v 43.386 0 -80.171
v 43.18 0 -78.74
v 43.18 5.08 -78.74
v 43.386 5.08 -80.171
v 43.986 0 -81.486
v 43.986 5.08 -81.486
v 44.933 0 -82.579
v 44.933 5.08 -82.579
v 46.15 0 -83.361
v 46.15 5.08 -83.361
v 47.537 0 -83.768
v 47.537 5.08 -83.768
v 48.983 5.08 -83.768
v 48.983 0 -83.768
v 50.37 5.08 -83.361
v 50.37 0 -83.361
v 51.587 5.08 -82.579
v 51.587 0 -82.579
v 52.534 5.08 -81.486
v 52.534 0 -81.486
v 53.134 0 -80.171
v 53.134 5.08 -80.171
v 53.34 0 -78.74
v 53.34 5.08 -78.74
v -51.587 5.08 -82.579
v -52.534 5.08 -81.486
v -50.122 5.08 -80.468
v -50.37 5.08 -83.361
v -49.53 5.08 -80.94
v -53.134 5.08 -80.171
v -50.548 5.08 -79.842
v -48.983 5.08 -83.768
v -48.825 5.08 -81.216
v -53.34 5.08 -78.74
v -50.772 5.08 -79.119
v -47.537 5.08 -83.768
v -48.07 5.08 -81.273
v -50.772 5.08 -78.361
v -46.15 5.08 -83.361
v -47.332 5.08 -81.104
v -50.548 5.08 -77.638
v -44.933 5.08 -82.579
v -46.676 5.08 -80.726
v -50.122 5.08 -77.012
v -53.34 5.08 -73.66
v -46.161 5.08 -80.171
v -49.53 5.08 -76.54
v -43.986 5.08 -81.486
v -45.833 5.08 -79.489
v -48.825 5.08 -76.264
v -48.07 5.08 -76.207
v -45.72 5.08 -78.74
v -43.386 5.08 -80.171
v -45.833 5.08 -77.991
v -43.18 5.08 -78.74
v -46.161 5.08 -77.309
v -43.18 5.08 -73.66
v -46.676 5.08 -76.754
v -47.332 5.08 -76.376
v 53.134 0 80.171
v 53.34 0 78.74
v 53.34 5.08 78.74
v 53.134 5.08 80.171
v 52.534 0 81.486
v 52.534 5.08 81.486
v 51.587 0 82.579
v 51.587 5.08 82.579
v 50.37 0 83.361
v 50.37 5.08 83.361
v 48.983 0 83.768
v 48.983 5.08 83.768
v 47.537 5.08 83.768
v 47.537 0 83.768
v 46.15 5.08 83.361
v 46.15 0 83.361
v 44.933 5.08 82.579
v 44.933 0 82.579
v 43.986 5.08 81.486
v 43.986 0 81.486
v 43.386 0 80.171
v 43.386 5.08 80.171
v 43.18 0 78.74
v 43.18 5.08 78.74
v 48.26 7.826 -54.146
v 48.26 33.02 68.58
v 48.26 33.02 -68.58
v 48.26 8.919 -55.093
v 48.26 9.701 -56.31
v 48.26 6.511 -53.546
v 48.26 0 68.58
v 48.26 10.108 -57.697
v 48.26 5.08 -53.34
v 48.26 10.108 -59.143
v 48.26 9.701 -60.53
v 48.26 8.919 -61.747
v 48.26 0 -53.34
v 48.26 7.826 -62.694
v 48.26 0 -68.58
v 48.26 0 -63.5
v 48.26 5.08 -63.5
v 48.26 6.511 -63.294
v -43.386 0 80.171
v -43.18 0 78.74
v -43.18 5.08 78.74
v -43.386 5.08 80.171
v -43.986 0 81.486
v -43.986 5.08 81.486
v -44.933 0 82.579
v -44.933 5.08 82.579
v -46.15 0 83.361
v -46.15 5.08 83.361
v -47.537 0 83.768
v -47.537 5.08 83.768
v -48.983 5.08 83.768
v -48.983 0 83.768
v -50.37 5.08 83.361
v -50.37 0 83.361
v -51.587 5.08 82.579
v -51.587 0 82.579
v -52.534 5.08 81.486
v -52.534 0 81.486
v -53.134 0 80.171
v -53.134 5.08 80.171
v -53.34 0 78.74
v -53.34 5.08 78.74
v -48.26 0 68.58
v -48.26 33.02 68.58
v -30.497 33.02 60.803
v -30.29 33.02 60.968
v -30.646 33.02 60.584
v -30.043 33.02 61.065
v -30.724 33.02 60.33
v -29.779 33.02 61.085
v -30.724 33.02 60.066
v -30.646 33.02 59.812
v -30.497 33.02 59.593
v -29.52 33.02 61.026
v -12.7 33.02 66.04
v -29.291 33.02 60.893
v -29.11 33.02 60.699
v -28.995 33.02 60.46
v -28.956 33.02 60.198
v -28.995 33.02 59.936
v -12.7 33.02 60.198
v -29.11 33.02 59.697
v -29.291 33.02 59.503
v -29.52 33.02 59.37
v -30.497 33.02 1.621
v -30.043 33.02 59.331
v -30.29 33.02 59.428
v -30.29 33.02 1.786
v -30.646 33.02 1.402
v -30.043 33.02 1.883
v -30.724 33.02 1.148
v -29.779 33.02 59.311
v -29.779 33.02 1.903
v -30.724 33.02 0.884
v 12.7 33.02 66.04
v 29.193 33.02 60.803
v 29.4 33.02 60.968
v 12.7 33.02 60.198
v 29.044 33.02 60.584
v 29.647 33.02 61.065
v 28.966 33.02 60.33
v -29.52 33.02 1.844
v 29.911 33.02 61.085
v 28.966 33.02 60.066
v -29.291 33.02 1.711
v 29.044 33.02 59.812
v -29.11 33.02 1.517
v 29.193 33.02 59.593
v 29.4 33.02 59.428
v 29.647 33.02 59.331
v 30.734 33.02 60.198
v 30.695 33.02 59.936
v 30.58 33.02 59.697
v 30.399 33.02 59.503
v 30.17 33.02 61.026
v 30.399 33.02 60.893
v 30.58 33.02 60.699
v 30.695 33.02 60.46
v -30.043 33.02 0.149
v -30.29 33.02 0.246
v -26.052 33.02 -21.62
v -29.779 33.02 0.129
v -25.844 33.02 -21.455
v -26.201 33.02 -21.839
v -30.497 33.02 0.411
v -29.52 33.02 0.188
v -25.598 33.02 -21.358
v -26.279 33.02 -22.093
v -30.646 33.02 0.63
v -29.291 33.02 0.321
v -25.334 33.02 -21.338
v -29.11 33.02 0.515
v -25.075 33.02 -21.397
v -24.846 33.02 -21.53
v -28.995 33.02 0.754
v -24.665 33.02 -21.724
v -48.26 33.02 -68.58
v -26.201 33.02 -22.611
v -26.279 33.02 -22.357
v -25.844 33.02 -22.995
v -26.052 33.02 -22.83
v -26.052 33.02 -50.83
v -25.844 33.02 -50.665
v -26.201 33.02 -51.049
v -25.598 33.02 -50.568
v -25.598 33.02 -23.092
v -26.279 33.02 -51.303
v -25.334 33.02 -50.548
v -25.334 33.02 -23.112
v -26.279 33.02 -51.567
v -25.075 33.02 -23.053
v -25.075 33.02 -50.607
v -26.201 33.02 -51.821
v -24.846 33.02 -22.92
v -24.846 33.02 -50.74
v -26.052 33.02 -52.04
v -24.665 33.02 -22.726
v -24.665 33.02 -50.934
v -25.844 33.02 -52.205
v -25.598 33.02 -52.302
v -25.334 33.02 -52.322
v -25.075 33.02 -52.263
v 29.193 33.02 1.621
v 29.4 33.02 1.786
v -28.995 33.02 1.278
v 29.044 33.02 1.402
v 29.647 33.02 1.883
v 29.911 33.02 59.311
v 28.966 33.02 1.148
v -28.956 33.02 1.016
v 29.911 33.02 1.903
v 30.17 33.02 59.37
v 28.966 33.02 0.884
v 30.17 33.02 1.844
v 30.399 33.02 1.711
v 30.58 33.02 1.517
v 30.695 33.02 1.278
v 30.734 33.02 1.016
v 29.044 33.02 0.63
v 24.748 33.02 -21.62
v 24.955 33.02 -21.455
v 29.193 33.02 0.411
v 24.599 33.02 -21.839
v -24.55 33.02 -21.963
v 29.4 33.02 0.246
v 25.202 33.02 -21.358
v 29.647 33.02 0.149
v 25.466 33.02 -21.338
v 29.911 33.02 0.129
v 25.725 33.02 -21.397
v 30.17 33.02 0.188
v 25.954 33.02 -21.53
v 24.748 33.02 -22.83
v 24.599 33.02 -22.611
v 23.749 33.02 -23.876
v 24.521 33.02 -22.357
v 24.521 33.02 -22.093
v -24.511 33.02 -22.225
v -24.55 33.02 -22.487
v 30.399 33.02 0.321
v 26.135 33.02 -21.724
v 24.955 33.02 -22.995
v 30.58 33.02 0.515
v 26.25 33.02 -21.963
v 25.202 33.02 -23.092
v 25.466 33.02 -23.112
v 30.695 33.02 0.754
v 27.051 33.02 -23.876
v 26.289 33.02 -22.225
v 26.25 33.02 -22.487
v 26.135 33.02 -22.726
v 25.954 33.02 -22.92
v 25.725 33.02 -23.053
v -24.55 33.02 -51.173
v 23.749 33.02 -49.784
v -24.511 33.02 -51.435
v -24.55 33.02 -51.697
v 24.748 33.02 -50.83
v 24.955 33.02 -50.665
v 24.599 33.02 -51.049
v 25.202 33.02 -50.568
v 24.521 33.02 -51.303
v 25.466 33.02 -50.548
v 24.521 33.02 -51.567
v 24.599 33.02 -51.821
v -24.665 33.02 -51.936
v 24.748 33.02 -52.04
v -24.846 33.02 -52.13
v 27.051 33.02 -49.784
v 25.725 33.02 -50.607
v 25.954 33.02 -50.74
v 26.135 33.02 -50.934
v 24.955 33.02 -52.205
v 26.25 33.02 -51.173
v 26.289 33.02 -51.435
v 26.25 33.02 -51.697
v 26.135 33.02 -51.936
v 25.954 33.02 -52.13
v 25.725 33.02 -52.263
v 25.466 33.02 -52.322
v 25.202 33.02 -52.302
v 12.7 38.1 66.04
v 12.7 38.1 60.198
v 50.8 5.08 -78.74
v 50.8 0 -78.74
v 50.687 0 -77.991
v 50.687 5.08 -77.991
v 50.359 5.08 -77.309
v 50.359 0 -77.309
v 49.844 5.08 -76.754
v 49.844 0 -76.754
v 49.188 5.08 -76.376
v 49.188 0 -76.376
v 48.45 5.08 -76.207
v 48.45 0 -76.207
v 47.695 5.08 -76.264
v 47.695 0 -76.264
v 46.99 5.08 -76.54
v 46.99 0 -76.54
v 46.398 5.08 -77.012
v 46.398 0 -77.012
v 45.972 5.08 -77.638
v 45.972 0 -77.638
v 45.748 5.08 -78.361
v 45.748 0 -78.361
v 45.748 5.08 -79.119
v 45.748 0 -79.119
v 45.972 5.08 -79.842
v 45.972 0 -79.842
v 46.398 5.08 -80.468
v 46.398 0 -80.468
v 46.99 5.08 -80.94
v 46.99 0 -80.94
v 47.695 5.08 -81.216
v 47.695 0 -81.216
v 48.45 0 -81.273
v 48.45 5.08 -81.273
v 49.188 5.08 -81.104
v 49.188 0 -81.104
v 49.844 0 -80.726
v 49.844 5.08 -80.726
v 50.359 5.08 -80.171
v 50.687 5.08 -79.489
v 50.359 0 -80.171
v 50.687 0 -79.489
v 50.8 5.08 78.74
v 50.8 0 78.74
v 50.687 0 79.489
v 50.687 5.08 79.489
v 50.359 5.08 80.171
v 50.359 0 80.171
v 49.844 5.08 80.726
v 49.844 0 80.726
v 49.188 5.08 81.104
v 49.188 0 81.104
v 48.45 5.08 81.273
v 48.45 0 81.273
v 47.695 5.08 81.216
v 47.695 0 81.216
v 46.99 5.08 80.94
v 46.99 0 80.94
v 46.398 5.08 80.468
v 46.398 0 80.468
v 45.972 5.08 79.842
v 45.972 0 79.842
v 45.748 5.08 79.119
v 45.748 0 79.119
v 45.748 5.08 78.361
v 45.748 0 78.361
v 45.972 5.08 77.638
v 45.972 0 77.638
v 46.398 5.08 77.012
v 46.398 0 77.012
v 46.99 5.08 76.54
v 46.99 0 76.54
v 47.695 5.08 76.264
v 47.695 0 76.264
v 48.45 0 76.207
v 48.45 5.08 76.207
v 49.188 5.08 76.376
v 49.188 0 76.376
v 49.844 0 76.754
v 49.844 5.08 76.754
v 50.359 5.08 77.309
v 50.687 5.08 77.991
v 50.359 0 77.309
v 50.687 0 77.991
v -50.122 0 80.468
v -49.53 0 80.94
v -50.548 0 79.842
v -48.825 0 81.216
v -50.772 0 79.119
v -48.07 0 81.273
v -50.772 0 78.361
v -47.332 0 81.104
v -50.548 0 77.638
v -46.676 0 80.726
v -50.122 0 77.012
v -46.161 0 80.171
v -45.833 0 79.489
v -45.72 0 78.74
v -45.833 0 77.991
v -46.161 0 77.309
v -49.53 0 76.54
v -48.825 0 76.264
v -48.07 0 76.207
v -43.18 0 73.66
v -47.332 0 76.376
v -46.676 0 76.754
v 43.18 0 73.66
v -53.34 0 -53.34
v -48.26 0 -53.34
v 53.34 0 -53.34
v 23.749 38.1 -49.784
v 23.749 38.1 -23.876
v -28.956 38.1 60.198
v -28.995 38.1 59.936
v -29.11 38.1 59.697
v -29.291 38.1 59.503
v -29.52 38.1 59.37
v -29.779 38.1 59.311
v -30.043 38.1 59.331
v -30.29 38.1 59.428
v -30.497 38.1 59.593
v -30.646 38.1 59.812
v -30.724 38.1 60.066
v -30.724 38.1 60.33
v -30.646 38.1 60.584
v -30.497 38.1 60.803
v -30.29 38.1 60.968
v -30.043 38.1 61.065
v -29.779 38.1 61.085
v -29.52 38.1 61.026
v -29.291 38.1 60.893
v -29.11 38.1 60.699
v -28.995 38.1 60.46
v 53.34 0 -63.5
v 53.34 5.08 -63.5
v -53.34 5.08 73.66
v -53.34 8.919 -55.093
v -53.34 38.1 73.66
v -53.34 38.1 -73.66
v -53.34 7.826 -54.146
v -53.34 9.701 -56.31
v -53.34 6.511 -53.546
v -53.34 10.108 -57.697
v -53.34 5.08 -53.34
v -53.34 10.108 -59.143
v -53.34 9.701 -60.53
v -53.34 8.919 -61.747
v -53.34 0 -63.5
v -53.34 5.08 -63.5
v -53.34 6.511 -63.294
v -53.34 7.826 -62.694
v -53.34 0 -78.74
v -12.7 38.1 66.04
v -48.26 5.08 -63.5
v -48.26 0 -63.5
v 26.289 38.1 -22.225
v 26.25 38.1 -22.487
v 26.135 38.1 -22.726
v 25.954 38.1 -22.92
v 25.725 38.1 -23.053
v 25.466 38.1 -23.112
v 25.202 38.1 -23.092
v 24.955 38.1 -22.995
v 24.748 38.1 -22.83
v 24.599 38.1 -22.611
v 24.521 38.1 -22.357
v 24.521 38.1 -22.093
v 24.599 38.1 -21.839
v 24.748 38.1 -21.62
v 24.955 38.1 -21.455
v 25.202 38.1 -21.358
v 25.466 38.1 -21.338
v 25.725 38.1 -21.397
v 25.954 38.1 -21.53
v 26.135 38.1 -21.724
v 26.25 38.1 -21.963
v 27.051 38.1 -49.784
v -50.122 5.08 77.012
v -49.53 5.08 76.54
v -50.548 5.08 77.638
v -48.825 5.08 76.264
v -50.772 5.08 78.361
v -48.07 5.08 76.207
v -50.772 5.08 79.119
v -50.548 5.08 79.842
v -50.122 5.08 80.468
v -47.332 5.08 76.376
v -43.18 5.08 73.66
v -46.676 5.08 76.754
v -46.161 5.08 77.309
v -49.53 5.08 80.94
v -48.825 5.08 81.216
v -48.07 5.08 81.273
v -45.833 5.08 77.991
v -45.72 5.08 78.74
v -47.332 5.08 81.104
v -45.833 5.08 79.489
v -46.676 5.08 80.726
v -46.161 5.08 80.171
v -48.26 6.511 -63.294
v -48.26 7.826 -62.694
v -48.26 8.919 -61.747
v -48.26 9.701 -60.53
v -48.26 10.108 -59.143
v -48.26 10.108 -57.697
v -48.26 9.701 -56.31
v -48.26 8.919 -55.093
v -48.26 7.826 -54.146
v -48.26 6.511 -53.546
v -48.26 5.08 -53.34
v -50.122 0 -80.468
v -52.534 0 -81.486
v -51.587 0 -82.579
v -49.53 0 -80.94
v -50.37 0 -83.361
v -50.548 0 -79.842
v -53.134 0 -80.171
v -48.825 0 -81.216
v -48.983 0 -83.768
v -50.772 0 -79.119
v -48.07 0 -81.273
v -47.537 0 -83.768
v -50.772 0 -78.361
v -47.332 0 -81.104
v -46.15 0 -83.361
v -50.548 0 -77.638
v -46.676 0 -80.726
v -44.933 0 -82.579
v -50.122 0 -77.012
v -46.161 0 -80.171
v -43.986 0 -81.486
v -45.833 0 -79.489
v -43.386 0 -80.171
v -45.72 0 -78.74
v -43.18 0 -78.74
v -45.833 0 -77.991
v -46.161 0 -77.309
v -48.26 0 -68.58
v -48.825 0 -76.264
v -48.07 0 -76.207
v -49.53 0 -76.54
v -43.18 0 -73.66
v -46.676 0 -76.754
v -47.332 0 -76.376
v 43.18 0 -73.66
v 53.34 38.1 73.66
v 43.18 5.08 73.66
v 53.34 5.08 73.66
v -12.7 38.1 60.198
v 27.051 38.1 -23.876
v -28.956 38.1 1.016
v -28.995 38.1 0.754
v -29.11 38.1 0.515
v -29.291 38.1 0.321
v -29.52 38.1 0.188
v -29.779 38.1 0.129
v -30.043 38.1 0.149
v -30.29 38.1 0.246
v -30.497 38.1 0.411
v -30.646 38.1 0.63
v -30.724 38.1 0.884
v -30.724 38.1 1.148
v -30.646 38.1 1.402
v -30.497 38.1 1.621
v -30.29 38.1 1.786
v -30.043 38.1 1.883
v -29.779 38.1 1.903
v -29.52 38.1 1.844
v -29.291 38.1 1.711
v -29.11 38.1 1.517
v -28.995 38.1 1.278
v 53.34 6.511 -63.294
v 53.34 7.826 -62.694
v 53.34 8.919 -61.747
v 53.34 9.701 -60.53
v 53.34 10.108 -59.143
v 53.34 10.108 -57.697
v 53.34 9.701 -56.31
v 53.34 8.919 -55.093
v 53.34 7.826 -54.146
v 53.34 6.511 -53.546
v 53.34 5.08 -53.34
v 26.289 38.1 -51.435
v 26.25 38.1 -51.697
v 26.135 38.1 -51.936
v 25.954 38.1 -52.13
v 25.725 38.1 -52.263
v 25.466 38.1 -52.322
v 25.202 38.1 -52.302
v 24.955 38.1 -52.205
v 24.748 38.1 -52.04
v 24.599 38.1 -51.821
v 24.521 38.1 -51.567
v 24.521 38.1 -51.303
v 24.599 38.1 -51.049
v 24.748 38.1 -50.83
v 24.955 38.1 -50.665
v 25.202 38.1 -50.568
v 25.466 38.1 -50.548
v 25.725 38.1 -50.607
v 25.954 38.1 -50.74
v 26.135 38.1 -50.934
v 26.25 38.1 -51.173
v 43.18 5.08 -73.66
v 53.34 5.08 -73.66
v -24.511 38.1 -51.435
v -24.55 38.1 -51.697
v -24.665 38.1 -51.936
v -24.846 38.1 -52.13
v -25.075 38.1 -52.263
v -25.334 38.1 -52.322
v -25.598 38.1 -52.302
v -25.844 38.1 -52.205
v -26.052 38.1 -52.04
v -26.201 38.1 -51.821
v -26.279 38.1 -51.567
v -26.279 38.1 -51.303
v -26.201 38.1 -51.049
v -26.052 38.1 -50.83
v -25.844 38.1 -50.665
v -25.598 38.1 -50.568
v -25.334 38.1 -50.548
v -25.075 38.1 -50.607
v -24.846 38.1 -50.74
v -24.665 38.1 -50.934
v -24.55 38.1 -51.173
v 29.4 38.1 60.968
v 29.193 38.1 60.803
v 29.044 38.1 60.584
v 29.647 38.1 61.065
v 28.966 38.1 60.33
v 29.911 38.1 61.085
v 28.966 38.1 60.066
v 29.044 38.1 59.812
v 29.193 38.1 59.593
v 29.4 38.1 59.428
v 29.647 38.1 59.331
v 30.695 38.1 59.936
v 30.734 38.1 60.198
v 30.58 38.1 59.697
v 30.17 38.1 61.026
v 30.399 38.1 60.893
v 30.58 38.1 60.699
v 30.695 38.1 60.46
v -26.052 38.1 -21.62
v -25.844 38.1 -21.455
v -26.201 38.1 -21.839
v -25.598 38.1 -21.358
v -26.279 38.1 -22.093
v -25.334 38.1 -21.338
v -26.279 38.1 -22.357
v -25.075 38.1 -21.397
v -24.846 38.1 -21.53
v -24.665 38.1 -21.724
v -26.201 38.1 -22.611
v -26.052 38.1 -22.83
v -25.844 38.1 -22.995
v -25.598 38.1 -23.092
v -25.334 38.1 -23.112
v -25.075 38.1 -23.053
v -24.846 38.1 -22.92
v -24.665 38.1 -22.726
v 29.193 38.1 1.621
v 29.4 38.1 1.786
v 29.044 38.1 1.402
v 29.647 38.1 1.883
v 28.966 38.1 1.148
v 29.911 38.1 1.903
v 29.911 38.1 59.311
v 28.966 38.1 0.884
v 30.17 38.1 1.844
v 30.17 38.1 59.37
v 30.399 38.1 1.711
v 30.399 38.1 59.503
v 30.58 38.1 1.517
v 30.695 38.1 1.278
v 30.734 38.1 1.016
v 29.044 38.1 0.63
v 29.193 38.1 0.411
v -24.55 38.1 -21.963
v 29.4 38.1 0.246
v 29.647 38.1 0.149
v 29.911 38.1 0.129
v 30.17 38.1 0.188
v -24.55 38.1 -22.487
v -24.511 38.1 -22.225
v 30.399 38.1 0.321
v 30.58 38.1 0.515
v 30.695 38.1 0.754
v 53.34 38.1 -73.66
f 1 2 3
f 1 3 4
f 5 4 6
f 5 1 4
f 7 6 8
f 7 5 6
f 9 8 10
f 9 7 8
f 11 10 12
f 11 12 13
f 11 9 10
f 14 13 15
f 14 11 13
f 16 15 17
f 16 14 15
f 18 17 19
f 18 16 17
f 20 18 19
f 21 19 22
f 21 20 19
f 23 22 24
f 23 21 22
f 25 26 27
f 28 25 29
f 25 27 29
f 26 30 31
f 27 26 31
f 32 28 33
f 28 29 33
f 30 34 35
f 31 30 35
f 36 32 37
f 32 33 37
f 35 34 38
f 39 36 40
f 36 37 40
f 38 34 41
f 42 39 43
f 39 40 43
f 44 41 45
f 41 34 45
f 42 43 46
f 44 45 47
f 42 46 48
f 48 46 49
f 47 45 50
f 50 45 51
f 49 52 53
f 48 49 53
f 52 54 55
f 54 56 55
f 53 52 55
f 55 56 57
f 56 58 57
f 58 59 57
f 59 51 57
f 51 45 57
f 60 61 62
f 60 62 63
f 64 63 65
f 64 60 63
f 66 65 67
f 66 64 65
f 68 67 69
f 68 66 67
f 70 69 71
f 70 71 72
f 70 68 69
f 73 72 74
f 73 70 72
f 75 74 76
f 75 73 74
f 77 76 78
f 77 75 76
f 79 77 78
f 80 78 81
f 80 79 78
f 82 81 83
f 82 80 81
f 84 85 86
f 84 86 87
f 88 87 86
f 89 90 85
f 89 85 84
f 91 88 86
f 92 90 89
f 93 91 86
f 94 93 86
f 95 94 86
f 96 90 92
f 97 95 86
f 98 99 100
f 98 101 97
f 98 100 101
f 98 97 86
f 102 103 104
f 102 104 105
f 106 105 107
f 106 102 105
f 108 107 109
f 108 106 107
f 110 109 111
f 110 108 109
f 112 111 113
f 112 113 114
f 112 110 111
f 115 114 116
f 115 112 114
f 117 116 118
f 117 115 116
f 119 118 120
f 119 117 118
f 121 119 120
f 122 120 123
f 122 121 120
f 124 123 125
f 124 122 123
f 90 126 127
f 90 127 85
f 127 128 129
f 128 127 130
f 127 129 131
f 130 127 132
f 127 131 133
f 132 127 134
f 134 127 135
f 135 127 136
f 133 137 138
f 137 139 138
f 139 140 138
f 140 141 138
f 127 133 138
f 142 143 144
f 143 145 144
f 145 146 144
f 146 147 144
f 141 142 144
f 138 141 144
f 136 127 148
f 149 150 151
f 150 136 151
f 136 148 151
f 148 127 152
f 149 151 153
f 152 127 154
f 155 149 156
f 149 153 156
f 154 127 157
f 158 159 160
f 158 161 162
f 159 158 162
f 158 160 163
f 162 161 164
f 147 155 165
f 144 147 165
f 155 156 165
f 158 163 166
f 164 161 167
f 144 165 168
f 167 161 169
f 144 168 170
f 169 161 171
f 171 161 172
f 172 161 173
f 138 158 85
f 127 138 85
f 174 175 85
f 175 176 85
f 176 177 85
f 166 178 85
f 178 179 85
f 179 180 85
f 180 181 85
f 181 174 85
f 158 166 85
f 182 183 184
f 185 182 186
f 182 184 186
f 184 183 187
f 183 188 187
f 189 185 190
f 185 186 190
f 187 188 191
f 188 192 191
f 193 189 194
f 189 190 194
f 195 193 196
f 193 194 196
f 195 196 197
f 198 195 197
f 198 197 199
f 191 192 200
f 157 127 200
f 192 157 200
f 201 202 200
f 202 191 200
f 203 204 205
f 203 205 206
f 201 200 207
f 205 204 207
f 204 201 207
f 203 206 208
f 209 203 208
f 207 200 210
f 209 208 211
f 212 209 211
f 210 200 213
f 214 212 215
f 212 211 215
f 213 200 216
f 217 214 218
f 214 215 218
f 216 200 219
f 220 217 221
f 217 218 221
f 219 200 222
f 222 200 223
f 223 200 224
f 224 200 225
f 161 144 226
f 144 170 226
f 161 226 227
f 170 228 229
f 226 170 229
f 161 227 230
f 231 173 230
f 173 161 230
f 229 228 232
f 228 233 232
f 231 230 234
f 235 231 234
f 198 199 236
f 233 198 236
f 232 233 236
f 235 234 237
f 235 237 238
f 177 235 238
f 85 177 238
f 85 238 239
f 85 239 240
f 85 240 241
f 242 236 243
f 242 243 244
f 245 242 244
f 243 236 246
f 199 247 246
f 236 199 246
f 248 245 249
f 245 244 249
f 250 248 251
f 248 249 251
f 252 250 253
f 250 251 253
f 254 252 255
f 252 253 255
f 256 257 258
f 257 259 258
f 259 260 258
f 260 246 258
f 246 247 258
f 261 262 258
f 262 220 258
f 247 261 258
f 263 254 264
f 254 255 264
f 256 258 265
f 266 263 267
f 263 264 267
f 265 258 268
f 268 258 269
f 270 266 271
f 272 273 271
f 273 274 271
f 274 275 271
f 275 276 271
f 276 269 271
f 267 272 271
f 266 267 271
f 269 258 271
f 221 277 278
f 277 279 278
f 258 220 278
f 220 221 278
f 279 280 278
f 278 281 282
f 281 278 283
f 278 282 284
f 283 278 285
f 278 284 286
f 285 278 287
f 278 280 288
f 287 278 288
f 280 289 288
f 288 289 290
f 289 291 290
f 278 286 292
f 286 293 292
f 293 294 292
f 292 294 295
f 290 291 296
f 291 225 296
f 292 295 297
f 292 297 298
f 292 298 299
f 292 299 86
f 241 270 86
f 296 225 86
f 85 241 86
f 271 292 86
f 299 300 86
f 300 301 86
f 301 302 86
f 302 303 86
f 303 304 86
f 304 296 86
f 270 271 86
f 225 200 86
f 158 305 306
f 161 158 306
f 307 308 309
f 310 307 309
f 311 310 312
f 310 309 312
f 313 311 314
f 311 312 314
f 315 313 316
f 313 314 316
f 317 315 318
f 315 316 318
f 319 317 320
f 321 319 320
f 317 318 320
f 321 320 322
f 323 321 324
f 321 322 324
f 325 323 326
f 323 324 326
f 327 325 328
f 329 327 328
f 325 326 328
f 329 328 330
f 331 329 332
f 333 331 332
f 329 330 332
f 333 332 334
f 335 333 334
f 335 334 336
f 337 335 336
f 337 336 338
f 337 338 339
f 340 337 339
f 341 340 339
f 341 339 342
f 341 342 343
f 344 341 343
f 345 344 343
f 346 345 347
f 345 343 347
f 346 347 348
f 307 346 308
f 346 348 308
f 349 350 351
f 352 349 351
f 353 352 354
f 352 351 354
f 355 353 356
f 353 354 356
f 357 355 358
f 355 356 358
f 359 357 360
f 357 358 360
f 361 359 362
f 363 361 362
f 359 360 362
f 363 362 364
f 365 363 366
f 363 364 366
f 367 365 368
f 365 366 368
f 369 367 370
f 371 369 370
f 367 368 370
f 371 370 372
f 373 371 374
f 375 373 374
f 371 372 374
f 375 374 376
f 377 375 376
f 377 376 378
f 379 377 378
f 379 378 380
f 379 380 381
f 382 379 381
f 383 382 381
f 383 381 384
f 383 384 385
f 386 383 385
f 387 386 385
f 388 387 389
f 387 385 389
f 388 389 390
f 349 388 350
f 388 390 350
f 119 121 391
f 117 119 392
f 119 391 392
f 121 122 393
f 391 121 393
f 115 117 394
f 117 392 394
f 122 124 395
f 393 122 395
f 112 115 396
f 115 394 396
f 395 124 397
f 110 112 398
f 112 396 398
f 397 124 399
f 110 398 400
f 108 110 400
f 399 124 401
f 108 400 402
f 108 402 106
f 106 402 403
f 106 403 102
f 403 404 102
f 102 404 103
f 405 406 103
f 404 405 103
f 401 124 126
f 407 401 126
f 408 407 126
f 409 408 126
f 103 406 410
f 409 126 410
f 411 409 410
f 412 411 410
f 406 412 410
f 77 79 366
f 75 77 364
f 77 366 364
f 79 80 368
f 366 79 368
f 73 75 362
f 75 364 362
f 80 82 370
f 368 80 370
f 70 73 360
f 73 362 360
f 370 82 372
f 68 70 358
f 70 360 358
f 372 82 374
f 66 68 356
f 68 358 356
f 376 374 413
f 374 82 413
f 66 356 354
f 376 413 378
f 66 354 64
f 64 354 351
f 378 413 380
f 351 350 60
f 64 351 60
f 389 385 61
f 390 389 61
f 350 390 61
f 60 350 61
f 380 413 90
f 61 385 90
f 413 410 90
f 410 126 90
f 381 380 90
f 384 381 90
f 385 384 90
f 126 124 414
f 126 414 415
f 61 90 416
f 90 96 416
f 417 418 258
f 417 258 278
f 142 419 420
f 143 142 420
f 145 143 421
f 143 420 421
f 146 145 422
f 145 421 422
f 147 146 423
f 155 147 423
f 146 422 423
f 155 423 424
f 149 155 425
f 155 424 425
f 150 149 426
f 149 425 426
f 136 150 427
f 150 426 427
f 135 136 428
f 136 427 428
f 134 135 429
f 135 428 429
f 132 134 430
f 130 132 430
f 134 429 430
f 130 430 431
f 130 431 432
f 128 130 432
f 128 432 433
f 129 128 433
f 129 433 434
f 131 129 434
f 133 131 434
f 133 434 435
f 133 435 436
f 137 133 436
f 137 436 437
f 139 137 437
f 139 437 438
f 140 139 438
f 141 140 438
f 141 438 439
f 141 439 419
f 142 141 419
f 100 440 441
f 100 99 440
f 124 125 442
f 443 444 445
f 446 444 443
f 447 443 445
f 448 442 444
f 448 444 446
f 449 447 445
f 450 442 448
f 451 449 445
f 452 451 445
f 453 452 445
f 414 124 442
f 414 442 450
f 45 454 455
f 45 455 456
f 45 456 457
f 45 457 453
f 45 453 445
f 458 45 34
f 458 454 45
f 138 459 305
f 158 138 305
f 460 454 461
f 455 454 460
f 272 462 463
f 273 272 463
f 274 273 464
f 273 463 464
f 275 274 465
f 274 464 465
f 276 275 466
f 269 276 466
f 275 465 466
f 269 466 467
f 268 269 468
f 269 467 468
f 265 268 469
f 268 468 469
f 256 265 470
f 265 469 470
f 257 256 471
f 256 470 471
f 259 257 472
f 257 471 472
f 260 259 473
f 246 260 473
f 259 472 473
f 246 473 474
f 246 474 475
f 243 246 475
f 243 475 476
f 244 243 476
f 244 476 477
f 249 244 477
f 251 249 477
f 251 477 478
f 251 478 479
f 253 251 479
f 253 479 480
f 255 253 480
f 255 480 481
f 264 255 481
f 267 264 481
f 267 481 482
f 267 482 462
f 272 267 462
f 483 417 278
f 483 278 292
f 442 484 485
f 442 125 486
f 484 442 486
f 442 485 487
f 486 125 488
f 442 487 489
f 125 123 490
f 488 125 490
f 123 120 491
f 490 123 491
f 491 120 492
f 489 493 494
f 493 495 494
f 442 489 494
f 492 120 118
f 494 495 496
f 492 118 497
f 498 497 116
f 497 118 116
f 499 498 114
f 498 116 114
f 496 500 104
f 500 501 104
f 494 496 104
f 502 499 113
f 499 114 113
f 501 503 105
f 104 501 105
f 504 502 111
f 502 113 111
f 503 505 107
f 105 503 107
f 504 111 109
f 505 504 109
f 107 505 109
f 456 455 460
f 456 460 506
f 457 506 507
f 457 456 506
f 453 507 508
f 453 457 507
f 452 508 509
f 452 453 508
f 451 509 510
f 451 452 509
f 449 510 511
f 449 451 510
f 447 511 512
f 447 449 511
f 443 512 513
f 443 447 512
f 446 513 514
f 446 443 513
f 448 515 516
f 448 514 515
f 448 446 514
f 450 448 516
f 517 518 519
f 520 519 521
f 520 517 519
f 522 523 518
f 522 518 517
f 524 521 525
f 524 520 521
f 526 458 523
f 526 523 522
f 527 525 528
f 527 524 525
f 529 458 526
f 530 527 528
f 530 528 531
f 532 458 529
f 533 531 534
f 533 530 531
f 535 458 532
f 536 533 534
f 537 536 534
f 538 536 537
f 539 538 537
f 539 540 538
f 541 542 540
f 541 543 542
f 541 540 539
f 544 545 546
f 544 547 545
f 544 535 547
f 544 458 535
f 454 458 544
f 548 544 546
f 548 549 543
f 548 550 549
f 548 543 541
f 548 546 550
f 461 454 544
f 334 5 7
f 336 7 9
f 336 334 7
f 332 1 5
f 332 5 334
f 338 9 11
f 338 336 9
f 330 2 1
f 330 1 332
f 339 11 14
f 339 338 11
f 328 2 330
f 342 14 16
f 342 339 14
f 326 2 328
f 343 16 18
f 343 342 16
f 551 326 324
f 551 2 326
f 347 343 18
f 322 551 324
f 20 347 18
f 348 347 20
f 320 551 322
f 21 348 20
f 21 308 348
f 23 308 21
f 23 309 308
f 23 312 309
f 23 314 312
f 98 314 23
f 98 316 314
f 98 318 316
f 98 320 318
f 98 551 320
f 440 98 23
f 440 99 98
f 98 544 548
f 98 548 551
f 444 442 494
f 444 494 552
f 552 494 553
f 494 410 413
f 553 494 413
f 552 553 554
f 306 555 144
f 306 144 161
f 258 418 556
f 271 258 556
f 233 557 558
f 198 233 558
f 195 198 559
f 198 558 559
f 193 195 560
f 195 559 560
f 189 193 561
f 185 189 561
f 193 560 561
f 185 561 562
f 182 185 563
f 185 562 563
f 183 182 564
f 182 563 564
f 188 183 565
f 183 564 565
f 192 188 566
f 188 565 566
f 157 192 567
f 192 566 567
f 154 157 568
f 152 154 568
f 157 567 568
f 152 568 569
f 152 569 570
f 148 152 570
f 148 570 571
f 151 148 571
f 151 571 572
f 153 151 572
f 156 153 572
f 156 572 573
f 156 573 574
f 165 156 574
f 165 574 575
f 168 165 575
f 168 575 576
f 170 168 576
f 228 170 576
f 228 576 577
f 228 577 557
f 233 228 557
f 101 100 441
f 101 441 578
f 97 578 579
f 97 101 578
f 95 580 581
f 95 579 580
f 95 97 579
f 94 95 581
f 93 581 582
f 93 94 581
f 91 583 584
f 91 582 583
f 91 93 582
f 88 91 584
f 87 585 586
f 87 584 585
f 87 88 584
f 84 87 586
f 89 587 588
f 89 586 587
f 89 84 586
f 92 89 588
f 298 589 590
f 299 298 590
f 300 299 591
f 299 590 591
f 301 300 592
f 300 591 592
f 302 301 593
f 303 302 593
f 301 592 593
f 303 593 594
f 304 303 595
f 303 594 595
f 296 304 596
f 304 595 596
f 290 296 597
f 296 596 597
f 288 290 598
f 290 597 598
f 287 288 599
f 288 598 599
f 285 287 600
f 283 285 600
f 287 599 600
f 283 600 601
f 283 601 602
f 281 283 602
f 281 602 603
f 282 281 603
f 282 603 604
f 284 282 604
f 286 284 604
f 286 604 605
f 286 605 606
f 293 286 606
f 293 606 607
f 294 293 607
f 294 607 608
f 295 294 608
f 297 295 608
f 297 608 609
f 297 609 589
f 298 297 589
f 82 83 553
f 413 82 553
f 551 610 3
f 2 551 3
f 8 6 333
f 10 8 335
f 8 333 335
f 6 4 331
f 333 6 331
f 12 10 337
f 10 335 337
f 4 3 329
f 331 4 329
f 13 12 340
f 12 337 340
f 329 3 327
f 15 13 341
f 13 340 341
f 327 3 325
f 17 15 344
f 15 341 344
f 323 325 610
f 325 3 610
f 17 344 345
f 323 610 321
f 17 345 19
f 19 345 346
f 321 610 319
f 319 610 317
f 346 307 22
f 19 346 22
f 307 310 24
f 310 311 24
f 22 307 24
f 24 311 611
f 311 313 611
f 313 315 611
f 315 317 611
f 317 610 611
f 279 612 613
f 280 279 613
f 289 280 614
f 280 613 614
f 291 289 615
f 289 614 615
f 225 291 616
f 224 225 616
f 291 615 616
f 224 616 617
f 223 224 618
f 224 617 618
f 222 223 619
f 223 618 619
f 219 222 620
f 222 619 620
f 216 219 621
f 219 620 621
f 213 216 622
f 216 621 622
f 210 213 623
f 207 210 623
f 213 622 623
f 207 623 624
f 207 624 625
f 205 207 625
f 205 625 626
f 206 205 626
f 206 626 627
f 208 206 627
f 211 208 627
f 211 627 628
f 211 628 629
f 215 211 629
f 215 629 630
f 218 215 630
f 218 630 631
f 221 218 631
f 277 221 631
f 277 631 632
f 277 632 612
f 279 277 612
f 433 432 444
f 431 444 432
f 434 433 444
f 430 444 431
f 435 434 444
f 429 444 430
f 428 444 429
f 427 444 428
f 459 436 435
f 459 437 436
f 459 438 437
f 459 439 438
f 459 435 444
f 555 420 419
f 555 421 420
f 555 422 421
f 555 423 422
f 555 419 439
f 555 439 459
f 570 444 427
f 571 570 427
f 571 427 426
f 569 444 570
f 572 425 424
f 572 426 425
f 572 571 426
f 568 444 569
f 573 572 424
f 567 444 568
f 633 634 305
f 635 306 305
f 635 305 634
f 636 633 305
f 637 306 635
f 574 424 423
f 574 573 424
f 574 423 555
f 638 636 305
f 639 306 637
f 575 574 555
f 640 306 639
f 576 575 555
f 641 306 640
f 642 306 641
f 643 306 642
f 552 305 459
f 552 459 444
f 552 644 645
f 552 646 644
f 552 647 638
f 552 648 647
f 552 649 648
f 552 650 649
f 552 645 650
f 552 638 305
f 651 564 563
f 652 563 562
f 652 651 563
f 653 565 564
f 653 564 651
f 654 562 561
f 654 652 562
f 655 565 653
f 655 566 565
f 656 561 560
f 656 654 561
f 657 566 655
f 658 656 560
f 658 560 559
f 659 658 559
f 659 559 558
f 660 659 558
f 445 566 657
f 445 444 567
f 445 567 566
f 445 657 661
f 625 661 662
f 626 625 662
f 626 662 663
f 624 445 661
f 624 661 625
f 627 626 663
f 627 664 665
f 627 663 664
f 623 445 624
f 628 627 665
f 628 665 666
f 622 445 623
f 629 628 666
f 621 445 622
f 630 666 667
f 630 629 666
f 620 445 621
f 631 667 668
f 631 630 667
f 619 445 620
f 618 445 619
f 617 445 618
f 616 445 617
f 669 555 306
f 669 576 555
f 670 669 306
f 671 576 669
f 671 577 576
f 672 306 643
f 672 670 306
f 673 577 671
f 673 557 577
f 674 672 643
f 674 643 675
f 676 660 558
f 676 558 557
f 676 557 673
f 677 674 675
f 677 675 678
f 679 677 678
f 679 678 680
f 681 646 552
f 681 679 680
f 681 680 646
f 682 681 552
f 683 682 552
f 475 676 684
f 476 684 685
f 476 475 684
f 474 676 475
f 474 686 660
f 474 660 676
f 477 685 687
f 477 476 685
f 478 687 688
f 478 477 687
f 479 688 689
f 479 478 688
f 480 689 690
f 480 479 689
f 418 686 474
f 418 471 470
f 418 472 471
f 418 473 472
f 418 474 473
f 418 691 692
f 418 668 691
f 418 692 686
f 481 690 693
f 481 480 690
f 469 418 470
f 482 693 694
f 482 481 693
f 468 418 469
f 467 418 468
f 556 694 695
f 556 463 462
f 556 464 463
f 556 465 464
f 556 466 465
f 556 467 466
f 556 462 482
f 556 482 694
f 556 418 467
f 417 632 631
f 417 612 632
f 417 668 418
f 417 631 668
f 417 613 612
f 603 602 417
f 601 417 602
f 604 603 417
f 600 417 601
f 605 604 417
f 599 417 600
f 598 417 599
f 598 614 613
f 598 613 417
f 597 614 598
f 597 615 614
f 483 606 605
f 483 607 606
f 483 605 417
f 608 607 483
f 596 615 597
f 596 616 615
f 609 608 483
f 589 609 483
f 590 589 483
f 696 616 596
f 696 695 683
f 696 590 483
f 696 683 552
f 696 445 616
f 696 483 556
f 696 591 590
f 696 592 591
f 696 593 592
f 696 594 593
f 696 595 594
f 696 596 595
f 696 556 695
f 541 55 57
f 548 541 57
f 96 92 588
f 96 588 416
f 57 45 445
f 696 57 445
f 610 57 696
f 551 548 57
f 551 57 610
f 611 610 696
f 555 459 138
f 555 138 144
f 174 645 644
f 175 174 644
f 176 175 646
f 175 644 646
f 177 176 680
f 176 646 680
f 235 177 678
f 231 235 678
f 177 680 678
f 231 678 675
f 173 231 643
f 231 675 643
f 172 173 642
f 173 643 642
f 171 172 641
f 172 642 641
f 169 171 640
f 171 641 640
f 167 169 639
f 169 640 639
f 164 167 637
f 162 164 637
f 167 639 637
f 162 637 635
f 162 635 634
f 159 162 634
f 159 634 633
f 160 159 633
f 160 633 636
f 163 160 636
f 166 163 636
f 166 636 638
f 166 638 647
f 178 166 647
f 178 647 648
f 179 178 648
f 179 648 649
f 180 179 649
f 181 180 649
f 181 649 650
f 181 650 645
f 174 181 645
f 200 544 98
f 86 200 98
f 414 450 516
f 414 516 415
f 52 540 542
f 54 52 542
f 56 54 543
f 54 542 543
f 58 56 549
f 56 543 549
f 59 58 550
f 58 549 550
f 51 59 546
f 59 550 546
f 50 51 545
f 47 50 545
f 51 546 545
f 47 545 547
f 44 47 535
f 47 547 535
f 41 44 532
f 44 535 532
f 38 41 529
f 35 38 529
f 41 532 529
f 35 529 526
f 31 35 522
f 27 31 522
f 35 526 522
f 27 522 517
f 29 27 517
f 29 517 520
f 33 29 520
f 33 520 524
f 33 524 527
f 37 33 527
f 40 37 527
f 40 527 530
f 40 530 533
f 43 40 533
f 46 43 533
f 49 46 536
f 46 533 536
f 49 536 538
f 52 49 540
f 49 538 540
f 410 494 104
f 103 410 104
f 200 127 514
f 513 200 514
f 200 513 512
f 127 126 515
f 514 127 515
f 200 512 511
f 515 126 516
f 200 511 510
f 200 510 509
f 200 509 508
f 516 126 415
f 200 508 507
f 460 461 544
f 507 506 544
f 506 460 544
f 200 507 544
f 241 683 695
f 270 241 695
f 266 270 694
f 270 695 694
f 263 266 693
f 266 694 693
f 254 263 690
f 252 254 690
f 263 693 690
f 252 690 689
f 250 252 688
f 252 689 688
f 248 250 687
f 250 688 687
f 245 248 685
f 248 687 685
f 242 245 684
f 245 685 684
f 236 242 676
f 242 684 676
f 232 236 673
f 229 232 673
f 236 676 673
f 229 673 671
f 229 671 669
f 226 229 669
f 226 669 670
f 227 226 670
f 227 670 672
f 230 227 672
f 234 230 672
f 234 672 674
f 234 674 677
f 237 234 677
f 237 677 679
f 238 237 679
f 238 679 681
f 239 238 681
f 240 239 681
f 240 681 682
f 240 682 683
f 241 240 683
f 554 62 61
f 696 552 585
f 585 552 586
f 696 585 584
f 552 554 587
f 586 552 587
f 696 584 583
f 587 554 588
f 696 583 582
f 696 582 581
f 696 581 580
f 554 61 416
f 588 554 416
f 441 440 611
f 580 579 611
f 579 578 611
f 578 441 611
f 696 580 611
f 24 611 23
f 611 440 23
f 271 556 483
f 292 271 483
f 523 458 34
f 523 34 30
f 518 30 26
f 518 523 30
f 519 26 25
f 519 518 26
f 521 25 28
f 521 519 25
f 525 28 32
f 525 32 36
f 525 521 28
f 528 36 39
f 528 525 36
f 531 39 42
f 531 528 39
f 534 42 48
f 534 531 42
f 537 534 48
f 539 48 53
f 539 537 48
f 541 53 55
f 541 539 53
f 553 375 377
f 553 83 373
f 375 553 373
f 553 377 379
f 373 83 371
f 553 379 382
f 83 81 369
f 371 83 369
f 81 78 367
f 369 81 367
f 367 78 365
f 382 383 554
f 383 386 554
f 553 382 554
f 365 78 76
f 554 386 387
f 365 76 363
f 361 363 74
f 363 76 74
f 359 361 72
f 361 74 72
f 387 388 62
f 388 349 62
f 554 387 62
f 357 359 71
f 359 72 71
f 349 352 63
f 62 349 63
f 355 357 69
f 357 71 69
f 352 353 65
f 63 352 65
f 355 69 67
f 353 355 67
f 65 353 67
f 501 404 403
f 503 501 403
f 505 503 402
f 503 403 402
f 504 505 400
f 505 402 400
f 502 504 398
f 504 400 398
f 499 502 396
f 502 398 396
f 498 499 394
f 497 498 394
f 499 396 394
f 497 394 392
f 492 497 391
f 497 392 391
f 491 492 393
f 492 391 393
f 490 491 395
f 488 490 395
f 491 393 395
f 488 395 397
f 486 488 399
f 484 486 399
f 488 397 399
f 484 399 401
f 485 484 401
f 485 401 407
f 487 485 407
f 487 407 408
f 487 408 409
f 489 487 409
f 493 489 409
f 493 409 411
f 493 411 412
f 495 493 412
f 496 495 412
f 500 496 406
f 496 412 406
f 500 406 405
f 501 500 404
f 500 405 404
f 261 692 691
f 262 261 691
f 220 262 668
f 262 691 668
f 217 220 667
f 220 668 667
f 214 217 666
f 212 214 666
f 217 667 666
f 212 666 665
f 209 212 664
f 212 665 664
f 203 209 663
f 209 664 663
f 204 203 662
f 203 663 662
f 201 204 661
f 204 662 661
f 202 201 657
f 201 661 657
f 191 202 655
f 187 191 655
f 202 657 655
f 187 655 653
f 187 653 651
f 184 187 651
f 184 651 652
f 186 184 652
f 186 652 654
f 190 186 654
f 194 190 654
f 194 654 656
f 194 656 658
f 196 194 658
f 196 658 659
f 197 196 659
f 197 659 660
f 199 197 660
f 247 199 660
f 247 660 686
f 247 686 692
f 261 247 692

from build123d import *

# Parameters (mm, degrees)
SKETCH1_W           = 106.68
SKETCH1_H           = 147.32
BOSS_EXTRUDE1_DEPTH = 38.1
SHELL1_T            = -5.08
SKETCH5_R           = 0.889
SKETCH5_W           = 3.302
SKETCH5_H           = 25.908
SKETCH5_W_2         = 25.4
SKETCH5_H_2         = 5.842
CUT_EXTRUDE1_DEPTH  = 38.1
CUT_EXTRUDE2_DEPTH  = 107.68
SKETCH15_R          = 2.54
BOSS_EXTRUDE5_DEPTH = 5.08


with BuildPart() as part:
    # Sketch1 → Boss-Extrude1 (new body)
    with BuildSketch(Plane(origin=(0, 0, 0), x_dir=(1, 0, 0), z_dir=(0, 1, 0))):
        Rectangle(SKETCH1_W, SKETCH1_H)
    extrude(amount=BOSS_EXTRUDE1_DEPTH)

    # Shell1
    shell1_openings = [part.faces().sort_by_distance(p)[0] for p in [
        (0, 0, 0),
    ]]
    offset(amount=SHELL1_T, openings=shell1_openings, kind=Kind.INTERSECTION)

    # Sketch5 → Cut-Extrude1 (cut)
    with BuildSketch(Plane(origin=(0, 38.1, 0), x_dir=(1, 0, 0), z_dir=(0, 1, 0))):
        with Locations((-25.4, 51.435)):
            Circle(SKETCH5_R)
        with Locations((-25.4, 22.225)):
            Circle(SKETCH5_R)
        with Locations((25.4, 36.83)):
            Rectangle(SKETCH5_W, SKETCH5_H)
        with Locations((25.4, 51.435)):
            Circle(SKETCH5_R)
        with Locations((25.4, 22.225)):
            Circle(SKETCH5_R)
        with Locations((0, -63.119)):
            Rectangle(SKETCH5_W_2, SKETCH5_H_2)
        with Locations((29.845, -60.198)):
            Circle(SKETCH5_R)
        with Locations((-29.845, -60.198)):
            Circle(SKETCH5_R)
        with Locations((-29.845, -1.016)):
            Circle(SKETCH5_R)
        with Locations((29.845, -1.016)):
            Circle(SKETCH5_R)
    extrude(amount=-CUT_EXTRUDE1_DEPTH, mode=Mode.SUBTRACT)

    # Sketch6 → Cut-Extrude2 (cut, through all)
    with BuildSketch(Plane.ZY.offset(53.34)):
        with BuildLine():
            Line((-63.5, -17.421133293), (-63.5, 5.08))
            ThreePointArc((-63.5, 5.08), (-58.42, 10.16), (-53.34, 5.08))
            Line((-53.34, 5.08), (-53.34, -17.421133293))
            ThreePointArc((-53.34, -17.421133293), (-58.42, -22.501133293), (-63.5, -17.421133293))
        make_face()
    extrude(amount=-CUT_EXTRUDE2_DEPTH, mode=Mode.SUBTRACT)

    # Sketch15 → Boss-Extrude5 (add)
    with BuildSketch(Plane.XZ):
        with BuildLine():
            Line((-53.34, -73.66), (-53.34, -78.74))
            ThreePointArc((-53.34, -78.74), (-48.26, -83.82), (-43.18, -78.74))
            Line((-43.18, -78.74), (-43.18, -73.66))
            Line((-43.18, -73.66), (-53.34, -73.66))
        make_face()
        with Locations((-48.26, -78.74)):
            Circle(SKETCH15_R, mode=Mode.SUBTRACT)
        with BuildLine():
            Line((53.34, -73.66), (43.18, -73.66))
            Line((43.18, -73.66), (43.18, -78.74))
            ThreePointArc((43.18, -78.74), (48.26, -83.82), (53.34, -78.74))
            Line((53.34, -78.74), (53.34, -73.66))
        make_face()
        with Locations((48.26, -78.74)):
            Circle(SKETCH15_R, mode=Mode.SUBTRACT)
        with BuildLine():
            Line((43.18, 78.74), (43.18, 73.66))
            Line((43.18, 73.66), (53.34, 73.66))
            Line((53.34, 73.66), (53.34, 78.74))
            ThreePointArc((53.34, 78.74), (48.26, 83.82), (43.18, 78.74))
        make_face()
        with Locations((48.26, 78.74)):
            Circle(SKETCH15_R, mode=Mode.SUBTRACT)
        with BuildLine():
            Line((-53.34, 78.74), (-53.34, 73.66))
            Line((-53.34, 73.66), (-43.18, 73.66))
            Line((-43.18, 73.66), (-43.18, 78.74))
            ThreePointArc((-43.18, 78.74), (-48.26, 83.82), (-53.34, 78.74))
        make_face()
        with Locations((-48.26, 78.74)):
            Circle(SKETCH15_R, mode=Mode.SUBTRACT)
    extrude(amount=-BOSS_EXTRUDE5_DEPTH)


solid = part.part
